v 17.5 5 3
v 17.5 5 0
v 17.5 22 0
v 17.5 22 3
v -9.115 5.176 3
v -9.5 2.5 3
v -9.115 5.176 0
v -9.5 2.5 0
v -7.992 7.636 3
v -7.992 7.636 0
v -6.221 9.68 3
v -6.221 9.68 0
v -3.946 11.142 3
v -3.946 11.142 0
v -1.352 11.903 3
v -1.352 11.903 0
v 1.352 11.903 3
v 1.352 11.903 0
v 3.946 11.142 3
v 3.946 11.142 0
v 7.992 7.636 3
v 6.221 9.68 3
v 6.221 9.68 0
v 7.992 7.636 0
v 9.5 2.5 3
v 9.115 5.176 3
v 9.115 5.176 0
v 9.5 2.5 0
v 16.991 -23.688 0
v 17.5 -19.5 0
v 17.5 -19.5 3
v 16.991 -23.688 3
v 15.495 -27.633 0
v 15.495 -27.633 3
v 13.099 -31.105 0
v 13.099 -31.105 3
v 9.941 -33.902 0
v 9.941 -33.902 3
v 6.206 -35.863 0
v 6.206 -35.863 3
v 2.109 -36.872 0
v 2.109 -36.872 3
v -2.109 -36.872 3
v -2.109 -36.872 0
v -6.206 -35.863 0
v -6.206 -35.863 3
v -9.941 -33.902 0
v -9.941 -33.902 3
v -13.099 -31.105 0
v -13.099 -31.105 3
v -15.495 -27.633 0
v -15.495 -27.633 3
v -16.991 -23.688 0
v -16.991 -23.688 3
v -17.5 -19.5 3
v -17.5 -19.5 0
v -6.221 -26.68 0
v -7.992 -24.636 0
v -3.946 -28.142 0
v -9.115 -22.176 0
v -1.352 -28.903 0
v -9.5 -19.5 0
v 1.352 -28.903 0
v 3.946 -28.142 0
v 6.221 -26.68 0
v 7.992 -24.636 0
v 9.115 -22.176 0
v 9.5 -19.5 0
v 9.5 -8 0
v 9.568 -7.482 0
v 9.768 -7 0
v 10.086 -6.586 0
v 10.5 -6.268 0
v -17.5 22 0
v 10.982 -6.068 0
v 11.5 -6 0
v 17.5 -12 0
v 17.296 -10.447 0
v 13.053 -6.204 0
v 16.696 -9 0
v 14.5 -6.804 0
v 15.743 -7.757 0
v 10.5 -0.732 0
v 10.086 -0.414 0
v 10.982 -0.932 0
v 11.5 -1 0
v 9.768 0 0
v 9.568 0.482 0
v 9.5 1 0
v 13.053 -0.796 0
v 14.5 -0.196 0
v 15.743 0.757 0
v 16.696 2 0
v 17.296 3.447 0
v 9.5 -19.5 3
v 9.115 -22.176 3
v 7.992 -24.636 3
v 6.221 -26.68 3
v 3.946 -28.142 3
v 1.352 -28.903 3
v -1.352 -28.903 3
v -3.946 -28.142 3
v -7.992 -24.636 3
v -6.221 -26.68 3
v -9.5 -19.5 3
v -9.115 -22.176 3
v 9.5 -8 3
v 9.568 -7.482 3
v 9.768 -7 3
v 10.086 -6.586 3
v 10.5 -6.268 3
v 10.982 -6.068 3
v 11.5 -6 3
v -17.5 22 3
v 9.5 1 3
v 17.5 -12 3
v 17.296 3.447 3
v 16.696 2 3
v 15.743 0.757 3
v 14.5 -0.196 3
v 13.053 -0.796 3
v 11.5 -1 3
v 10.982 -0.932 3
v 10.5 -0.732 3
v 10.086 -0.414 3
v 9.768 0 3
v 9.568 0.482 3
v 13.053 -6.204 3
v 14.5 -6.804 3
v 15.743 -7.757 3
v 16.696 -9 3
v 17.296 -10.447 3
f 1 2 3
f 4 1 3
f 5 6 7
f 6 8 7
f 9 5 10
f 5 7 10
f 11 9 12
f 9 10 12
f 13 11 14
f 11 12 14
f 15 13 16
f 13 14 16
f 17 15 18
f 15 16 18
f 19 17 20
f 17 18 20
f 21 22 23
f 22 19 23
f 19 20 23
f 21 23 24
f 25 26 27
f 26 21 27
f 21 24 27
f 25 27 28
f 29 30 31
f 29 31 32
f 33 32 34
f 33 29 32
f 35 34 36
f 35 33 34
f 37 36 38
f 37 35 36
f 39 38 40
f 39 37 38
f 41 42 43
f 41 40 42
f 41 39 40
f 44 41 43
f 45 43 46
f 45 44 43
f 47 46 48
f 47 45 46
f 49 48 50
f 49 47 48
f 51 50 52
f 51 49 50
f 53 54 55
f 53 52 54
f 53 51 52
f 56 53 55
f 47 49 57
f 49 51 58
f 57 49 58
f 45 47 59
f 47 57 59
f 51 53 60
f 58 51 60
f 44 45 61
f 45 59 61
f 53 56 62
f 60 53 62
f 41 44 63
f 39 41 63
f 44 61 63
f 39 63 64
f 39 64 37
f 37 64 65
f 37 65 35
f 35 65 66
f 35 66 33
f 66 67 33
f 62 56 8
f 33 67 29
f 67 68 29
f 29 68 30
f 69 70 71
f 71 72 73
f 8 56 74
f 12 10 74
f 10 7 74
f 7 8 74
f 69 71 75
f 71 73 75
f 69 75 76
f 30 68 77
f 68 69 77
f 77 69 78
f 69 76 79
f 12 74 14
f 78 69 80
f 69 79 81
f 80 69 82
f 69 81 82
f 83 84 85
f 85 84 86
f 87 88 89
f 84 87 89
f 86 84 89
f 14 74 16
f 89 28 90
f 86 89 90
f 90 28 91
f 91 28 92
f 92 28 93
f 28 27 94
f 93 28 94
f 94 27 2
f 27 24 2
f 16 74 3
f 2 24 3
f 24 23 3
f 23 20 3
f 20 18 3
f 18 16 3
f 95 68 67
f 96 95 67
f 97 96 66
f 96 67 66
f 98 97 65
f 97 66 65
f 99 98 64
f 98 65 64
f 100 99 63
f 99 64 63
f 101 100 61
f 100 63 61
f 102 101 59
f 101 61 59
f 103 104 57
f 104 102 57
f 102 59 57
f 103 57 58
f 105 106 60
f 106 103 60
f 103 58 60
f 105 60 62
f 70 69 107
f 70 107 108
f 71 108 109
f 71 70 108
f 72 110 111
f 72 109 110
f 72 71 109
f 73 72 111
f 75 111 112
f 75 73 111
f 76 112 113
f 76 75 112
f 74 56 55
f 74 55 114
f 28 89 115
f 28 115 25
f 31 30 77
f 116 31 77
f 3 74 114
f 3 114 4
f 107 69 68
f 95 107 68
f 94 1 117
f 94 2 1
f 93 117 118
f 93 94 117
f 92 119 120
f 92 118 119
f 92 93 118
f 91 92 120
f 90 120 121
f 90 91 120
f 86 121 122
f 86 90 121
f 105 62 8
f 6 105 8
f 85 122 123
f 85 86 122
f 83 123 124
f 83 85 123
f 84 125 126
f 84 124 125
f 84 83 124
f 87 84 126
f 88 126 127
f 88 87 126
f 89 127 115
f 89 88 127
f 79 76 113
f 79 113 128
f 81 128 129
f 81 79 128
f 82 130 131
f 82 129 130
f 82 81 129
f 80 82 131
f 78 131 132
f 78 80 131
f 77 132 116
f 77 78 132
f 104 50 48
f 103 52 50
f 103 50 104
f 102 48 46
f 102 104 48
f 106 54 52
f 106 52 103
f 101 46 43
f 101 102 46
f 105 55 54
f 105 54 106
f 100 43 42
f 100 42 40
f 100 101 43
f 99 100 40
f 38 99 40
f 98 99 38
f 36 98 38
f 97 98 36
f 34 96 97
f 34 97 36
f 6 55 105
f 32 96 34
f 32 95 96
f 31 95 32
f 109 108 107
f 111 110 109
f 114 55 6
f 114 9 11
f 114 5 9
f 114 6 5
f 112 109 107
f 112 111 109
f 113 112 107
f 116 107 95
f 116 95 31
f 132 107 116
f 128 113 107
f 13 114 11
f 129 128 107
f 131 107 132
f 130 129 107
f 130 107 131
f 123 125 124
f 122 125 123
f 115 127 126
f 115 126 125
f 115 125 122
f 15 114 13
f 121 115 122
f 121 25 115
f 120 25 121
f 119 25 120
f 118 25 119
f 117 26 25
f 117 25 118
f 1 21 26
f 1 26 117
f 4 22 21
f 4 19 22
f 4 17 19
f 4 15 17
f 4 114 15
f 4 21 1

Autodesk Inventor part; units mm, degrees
ref_plane "YZ Plane" through (0, 0, 0) normal (1, 0, 0) x (0, 1, 0)
ref_plane "XZ Plane" through (0, 0, 0) normal (0, 1, 0) x (-1, 0, 0)
ref_plane "XY Plane" through (0, 0, 0) normal (0, 0, 1) x (1, 0, 0)
sketch "Sketch1" plane through (0, 0, 0) normal (0, 0, 1) x (1, 0, 0)
  line L0 (-1.5, 4) -> (1.5, 4) construction
  line L1 (1.5, 4) -> (1.5, -4) construction
  line L2 (1.5, -4) -> (-1.5, -4) construction
  line L3 (-1.5, -4) -> (-1.5, 4) construction
  line L4 (9.5, 2.5) -> (9.5, -29) construction
  line L5 (9.5, -29) -> (-9.5, -29) construction
  line L6 (-9.5, -29) -> (-9.5, 2.5)
  arc A0 (-9.5, -19.5) -> (9.5, -19.5) centre (0, -19.5) ccw
  arc A1 (-17.5, -19.5) -> (17.5, -19.5) centre (0, -19.5) ccw
  line L7 (11.5, -1) -> (20.6171, -1) construction
  line L8 (17.5, 5) -> (17.5, 22)
  line L9 (-17.5, -19.5) -> (-17.5, 22)
  line L10 (9.5, 1) -> (9.5, 2.5)
  line L11 (0, -37) -> (17.5, -37) construction
  arc A2 (11.5, -1) -> (17.5, 5) centre (11.5, 5) ccw
  arc A3 (9.5, 1) -> (11.5, -1) centre (11.5, 1) ccw
  line L12 (11.4283, -3.5) -> (20.9038, -3.5) construction
  arc A4 (17.5, -12) -> (11.5, -6) centre (11.5, -12) ccw
  arc A5 (11.5, -6) -> (9.5, -8) centre (11.5, -8) ccw
  line L13 (9.5, -8) -> (9.5, -19.5)
  line L14 (17.5, -19.5) -> (17.5, -12)
  line L15 (-17.5, 22) -> (17.5, 22)
  line L16 (-22.1996, 12) -> (26.487, 12) construction
  arc A6 (9.5, 2.5) -> (-9.5, 2.5) centre (0, 2.5) ccw
  point P0 (0, 0)
  point P1 (0, -4)
  point P2 (-1.5, 0)
  point P3 (0, -29)
  point P4 (0, 12)
  dimension "d0" = 8
  dimension "d1" = 3
  dimension "extra" = 25
  dimension "d4" = 8
  dimension "d6" = 8
  dimension "d10" = 4
  dimension "d11" = 2.5
  dimension "d12" = 3.5
  dimension "d18" = 8
  dimension "d21" = 10
  dimension "d22" = 35
extrude "Extrusion1" add sketch "Sketch1" along normal blind 3
properties part number "uhook"
